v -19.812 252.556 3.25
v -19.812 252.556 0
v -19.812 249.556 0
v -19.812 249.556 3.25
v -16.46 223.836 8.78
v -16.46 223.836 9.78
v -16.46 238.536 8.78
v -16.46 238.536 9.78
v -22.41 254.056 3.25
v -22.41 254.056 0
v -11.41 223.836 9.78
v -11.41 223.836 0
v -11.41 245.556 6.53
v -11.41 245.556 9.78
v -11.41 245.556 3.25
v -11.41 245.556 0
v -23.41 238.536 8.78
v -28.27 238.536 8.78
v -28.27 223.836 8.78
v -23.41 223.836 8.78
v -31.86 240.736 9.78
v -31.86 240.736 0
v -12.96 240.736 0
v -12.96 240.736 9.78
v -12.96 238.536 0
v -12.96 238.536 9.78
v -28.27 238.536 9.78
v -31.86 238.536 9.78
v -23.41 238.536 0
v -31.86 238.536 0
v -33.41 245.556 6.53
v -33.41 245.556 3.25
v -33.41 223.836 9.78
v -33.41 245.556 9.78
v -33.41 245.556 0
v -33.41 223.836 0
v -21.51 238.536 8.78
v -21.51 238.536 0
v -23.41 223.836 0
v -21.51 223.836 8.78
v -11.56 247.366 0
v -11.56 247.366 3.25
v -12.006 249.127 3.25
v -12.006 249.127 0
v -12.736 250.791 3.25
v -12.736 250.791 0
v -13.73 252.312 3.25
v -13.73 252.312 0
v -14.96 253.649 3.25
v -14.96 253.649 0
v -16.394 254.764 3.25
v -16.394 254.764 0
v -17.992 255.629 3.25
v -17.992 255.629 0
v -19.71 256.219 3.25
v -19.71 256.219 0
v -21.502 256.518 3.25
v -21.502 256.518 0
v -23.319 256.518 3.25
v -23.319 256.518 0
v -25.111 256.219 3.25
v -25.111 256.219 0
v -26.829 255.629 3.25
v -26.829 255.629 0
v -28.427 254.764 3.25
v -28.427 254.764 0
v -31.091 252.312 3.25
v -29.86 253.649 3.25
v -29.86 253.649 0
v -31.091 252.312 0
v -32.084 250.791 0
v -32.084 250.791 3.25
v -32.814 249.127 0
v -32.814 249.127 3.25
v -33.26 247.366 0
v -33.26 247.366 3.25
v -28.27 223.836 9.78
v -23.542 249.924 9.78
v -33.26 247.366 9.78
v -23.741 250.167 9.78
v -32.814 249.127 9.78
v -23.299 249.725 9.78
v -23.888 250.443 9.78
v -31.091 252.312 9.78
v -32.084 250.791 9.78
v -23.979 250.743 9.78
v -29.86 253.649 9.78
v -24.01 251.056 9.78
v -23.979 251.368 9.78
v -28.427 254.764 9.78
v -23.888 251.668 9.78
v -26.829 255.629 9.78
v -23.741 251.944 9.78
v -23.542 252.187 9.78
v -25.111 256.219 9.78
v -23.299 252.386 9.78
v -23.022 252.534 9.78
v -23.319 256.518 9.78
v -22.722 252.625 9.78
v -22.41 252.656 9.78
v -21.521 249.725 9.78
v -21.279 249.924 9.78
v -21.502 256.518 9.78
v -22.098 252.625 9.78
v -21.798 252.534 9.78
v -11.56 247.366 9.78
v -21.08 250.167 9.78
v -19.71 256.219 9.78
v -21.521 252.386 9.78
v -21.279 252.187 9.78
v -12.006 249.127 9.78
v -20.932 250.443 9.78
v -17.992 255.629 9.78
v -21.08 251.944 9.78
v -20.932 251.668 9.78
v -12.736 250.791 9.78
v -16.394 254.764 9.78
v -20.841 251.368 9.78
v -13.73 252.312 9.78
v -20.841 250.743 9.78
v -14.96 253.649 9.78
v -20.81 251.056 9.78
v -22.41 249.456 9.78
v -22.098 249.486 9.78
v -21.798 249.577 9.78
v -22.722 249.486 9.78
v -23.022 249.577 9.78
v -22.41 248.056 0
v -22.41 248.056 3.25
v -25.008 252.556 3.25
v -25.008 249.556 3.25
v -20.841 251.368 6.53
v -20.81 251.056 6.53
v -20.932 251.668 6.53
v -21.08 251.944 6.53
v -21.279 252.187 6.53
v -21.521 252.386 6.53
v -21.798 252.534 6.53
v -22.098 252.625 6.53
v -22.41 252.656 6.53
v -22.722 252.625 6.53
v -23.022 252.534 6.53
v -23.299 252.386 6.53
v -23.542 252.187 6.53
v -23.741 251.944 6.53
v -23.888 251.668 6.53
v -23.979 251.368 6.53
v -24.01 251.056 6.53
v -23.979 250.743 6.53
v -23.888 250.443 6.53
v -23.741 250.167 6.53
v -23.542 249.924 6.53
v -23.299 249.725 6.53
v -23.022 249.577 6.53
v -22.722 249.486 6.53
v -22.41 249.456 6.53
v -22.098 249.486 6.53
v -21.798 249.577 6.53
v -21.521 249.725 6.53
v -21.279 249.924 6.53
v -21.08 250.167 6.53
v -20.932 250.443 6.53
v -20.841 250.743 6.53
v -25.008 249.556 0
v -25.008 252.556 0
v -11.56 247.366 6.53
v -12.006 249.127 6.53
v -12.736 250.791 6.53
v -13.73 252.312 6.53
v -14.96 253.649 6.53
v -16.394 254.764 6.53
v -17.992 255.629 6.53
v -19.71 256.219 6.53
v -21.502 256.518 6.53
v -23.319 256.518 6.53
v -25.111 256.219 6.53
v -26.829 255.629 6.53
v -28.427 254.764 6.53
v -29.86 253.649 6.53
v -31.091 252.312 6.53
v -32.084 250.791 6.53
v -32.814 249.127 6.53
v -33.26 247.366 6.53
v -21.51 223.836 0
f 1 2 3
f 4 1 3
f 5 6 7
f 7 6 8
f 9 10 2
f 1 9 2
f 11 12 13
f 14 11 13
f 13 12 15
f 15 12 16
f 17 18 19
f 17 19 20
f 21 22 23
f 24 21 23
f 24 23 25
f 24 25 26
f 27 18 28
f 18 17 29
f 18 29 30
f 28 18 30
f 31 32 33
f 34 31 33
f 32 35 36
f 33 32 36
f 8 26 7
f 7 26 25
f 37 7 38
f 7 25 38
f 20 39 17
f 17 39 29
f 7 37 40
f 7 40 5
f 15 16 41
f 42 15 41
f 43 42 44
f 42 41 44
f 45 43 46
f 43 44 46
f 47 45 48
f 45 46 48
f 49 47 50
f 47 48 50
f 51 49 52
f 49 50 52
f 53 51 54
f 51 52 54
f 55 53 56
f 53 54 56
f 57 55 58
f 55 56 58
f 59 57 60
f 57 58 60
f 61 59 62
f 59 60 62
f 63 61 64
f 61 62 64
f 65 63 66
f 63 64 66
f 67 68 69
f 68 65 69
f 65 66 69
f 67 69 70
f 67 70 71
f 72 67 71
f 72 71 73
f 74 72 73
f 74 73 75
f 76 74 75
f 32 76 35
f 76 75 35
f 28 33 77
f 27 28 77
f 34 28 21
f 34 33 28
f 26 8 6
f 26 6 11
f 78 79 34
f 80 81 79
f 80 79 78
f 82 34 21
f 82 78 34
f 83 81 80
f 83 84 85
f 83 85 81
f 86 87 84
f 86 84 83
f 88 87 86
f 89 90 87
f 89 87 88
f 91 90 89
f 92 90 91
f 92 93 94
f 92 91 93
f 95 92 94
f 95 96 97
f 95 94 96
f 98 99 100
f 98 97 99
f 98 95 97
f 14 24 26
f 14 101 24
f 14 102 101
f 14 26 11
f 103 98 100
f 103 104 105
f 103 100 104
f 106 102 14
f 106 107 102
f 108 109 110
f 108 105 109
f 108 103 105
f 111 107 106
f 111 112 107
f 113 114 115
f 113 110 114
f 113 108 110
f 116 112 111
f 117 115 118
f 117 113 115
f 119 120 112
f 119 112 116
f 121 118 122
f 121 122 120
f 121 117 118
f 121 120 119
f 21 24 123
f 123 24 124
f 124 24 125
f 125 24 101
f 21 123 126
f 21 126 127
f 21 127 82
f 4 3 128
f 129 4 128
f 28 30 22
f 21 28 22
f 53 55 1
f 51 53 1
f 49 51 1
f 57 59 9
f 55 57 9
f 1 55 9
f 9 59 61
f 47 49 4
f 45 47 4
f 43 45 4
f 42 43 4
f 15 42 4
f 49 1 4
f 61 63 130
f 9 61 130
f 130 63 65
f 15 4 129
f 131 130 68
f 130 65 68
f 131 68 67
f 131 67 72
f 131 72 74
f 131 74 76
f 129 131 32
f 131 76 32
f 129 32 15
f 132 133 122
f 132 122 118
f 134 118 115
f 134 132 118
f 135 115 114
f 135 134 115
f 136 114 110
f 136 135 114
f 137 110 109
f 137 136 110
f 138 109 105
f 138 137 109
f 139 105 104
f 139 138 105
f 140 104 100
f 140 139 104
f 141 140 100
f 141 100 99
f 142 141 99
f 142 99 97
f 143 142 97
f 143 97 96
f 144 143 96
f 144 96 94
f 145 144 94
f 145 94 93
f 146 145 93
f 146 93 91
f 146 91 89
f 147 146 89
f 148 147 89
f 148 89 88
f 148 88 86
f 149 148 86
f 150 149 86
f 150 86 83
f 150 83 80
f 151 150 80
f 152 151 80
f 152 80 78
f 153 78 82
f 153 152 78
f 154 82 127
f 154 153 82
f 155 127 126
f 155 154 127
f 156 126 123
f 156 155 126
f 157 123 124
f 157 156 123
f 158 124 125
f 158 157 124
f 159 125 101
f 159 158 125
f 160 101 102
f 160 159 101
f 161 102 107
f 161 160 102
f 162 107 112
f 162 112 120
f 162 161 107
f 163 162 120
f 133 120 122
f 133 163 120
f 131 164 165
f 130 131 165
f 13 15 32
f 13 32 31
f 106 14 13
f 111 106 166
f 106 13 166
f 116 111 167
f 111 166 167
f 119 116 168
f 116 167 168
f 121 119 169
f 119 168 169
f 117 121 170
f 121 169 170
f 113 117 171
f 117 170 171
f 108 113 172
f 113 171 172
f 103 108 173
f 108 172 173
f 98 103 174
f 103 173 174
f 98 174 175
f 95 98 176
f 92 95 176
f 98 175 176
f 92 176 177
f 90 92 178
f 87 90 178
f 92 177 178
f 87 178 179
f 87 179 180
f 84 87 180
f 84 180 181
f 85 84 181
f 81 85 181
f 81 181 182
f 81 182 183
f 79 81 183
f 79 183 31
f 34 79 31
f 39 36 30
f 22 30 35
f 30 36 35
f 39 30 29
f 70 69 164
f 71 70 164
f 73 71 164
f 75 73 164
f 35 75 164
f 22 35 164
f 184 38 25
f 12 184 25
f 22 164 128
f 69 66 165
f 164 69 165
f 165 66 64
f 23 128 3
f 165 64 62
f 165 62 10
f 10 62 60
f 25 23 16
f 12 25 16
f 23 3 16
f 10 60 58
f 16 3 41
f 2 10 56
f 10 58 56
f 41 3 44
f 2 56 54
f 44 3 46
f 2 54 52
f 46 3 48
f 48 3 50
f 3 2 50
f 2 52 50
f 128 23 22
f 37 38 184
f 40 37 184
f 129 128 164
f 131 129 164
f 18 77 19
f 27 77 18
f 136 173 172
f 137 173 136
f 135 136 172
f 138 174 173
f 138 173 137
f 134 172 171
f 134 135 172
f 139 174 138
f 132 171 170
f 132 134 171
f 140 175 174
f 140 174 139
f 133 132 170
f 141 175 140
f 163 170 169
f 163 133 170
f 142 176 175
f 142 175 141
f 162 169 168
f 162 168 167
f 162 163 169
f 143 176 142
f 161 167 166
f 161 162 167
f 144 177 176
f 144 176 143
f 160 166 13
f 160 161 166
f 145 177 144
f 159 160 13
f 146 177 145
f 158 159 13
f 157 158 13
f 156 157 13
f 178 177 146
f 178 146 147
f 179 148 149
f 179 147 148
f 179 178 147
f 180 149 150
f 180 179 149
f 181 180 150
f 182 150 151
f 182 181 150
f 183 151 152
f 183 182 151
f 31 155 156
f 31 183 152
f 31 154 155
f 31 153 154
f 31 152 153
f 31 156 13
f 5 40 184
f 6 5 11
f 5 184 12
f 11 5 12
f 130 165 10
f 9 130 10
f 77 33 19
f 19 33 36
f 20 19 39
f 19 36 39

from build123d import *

# Parameters (mm, degrees)
F0_R      = 1.6
F1_DEPTH  = 9.78
F2_W      = 11.0329598772
F2_H      = 3.28
F3_DEPTH  = 22
F4_W      = 5.05
F4_H      = 15.2
F4_W_2    = 4.86
F5_DEPTH  = 1
F6_R      = 1.6
F7_DEPTH  = 3.26
F9_R      = 1.6
F10_DEPTH = 3.26
F11_DEPTH = 0.5


with BuildPart() as f1:
    # F0 (on Top) → F1 (new body)
    with BuildSketch(Plane.XY):
        with BuildLine():
            Line((-33.4101816105, 245.5555587423), (-33.4101816105, 223.8355587423))
            Line((-33.4101816105, 223.8355587423), (-23.4101816105, 223.8355587423))
            Line((-23.4101816105, 223.8355587423), (-23.4101816105, 239.0355587423))
            Line((-23.4101816105, 239.0355587423), (-31.8601816105, 239.0355587423))
            Line((-31.8601816105, 239.0355587423), (-31.8601816105, 240.7355587423))
            Line((-31.8601816105, 240.7355587423), (-23.4101816105, 240.7355587423))
            Line((-23.4101816105, 240.7355587423), (-21.5101816105, 240.7355587423))
            Line((-21.5101816105, 240.7355587423), (-12.9601816105, 240.7355587423))
            Line((-12.9601816105, 240.7355587423), (-12.9601816105, 239.0355587423))
            Line((-12.9601816105, 239.0355587423), (-21.5101816105, 239.0355587423))
            Line((-21.5101816105, 239.0355587423), (-21.5101816105, 223.8355587423))
            Line((-21.5101816105, 223.8355587423), (-11.4101816105, 223.8355587423))
            Line((-11.4101816105, 223.8355587423), (-11.4101816105, 245.5555587423))
            ThreePointArc((-11.4101816105, 245.5555587423), (-22.4101816105, 256.5555587423), (-33.4101816105, 245.5555587423))
        make_face()
        with Locations((-22.4101816105, 251.0555587423)):
            Circle(F0_R, mode=Mode.SUBTRACT)
    extrude(amount=F1_DEPTH)

    # F2 (on face) → F3 (cut)
    with BuildSketch(Plane(origin=(-33.4101816105, 0, 0), x_dir=(0, -1, 0), z_dir=(-1, 0, 0))):
        with Locations((-251.0720386809, 4.89)):
            Rectangle(F2_W, F2_H)
    extrude(amount=-F3_DEPTH, mode=Mode.SUBTRACT)

    # F4 (on face) → F5 (cut)
    with BuildSketch(Plane.XY.offset(9.78)):
        with Locations((-18.9851816105, 231.4355587423)):
            Rectangle(F4_W, F4_H)
        with Locations((-25.8401816105, 231.4355587423)):
            Rectangle(F4_W_2, F4_H)
    extrude(amount=-F5_DEPTH, mode=Mode.SUBTRACT)

    # F9 (on face) → F10 (cut)
    with BuildSketch(Plane(origin=(0, 0, 0), x_dir=(1, 0, 0), z_dir=(0, 0, -1))):
        Polygon((-22.4101816105, -254.0555587423), (-19.8121053991, -252.5555587423), (-19.8121053991, -249.5555587423), (-22.4101816105, -248.0555587423), (-25.0082578218, -249.5555587423), (-25.0082578218, -252.5555587423), align=None)
        with Locations((-22.4101816105, -251.0555587423)):
            Circle(F9_R, mode=Mode.SUBTRACT)
    extrude(amount=-F10_DEPTH, mode=Mode.SUBTRACT)

    # F11 (cut): faces of the model
    f11_faces = [f1.faces().sort_by_distance(p)[0] for p in [
        (-27.7473388211, 239.0355587423, 4.6156990782),
        (-17.1227008611, 239.0355587423, 4.6078340058),
    ]]
    extrude(f11_faces, amount=-F11_DEPTH, mode=Mode.SUBTRACT)


with BuildPart() as f7:
    # F6 (on face) → F7 (new body)
    with BuildSketch(Plane.XY.offset(3.25)):
        with BuildLine():
            Line((-11.4101816105, 334.1924881189), (-33.4101816105, 334.1924881189))
            Line((-33.4101816105, 334.1924881189), (-33.4101816105, 290.1924881189))
            ThreePointArc((-33.4101816105, 290.1924881189), (-22.4101816105, 279.1924881189), (-11.4101816105, 290.1924881189))
            Line((-11.4101816105, 290.1924881189), (-11.4101816105, 334.1924881189))
        make_face()
        with Locations((-22.4101816105, 284.5924881189)):
            Circle(F6_R, mode=Mode.SUBTRACT)
    extrude(amount=F7_DEPTH)


solid = f1.part
